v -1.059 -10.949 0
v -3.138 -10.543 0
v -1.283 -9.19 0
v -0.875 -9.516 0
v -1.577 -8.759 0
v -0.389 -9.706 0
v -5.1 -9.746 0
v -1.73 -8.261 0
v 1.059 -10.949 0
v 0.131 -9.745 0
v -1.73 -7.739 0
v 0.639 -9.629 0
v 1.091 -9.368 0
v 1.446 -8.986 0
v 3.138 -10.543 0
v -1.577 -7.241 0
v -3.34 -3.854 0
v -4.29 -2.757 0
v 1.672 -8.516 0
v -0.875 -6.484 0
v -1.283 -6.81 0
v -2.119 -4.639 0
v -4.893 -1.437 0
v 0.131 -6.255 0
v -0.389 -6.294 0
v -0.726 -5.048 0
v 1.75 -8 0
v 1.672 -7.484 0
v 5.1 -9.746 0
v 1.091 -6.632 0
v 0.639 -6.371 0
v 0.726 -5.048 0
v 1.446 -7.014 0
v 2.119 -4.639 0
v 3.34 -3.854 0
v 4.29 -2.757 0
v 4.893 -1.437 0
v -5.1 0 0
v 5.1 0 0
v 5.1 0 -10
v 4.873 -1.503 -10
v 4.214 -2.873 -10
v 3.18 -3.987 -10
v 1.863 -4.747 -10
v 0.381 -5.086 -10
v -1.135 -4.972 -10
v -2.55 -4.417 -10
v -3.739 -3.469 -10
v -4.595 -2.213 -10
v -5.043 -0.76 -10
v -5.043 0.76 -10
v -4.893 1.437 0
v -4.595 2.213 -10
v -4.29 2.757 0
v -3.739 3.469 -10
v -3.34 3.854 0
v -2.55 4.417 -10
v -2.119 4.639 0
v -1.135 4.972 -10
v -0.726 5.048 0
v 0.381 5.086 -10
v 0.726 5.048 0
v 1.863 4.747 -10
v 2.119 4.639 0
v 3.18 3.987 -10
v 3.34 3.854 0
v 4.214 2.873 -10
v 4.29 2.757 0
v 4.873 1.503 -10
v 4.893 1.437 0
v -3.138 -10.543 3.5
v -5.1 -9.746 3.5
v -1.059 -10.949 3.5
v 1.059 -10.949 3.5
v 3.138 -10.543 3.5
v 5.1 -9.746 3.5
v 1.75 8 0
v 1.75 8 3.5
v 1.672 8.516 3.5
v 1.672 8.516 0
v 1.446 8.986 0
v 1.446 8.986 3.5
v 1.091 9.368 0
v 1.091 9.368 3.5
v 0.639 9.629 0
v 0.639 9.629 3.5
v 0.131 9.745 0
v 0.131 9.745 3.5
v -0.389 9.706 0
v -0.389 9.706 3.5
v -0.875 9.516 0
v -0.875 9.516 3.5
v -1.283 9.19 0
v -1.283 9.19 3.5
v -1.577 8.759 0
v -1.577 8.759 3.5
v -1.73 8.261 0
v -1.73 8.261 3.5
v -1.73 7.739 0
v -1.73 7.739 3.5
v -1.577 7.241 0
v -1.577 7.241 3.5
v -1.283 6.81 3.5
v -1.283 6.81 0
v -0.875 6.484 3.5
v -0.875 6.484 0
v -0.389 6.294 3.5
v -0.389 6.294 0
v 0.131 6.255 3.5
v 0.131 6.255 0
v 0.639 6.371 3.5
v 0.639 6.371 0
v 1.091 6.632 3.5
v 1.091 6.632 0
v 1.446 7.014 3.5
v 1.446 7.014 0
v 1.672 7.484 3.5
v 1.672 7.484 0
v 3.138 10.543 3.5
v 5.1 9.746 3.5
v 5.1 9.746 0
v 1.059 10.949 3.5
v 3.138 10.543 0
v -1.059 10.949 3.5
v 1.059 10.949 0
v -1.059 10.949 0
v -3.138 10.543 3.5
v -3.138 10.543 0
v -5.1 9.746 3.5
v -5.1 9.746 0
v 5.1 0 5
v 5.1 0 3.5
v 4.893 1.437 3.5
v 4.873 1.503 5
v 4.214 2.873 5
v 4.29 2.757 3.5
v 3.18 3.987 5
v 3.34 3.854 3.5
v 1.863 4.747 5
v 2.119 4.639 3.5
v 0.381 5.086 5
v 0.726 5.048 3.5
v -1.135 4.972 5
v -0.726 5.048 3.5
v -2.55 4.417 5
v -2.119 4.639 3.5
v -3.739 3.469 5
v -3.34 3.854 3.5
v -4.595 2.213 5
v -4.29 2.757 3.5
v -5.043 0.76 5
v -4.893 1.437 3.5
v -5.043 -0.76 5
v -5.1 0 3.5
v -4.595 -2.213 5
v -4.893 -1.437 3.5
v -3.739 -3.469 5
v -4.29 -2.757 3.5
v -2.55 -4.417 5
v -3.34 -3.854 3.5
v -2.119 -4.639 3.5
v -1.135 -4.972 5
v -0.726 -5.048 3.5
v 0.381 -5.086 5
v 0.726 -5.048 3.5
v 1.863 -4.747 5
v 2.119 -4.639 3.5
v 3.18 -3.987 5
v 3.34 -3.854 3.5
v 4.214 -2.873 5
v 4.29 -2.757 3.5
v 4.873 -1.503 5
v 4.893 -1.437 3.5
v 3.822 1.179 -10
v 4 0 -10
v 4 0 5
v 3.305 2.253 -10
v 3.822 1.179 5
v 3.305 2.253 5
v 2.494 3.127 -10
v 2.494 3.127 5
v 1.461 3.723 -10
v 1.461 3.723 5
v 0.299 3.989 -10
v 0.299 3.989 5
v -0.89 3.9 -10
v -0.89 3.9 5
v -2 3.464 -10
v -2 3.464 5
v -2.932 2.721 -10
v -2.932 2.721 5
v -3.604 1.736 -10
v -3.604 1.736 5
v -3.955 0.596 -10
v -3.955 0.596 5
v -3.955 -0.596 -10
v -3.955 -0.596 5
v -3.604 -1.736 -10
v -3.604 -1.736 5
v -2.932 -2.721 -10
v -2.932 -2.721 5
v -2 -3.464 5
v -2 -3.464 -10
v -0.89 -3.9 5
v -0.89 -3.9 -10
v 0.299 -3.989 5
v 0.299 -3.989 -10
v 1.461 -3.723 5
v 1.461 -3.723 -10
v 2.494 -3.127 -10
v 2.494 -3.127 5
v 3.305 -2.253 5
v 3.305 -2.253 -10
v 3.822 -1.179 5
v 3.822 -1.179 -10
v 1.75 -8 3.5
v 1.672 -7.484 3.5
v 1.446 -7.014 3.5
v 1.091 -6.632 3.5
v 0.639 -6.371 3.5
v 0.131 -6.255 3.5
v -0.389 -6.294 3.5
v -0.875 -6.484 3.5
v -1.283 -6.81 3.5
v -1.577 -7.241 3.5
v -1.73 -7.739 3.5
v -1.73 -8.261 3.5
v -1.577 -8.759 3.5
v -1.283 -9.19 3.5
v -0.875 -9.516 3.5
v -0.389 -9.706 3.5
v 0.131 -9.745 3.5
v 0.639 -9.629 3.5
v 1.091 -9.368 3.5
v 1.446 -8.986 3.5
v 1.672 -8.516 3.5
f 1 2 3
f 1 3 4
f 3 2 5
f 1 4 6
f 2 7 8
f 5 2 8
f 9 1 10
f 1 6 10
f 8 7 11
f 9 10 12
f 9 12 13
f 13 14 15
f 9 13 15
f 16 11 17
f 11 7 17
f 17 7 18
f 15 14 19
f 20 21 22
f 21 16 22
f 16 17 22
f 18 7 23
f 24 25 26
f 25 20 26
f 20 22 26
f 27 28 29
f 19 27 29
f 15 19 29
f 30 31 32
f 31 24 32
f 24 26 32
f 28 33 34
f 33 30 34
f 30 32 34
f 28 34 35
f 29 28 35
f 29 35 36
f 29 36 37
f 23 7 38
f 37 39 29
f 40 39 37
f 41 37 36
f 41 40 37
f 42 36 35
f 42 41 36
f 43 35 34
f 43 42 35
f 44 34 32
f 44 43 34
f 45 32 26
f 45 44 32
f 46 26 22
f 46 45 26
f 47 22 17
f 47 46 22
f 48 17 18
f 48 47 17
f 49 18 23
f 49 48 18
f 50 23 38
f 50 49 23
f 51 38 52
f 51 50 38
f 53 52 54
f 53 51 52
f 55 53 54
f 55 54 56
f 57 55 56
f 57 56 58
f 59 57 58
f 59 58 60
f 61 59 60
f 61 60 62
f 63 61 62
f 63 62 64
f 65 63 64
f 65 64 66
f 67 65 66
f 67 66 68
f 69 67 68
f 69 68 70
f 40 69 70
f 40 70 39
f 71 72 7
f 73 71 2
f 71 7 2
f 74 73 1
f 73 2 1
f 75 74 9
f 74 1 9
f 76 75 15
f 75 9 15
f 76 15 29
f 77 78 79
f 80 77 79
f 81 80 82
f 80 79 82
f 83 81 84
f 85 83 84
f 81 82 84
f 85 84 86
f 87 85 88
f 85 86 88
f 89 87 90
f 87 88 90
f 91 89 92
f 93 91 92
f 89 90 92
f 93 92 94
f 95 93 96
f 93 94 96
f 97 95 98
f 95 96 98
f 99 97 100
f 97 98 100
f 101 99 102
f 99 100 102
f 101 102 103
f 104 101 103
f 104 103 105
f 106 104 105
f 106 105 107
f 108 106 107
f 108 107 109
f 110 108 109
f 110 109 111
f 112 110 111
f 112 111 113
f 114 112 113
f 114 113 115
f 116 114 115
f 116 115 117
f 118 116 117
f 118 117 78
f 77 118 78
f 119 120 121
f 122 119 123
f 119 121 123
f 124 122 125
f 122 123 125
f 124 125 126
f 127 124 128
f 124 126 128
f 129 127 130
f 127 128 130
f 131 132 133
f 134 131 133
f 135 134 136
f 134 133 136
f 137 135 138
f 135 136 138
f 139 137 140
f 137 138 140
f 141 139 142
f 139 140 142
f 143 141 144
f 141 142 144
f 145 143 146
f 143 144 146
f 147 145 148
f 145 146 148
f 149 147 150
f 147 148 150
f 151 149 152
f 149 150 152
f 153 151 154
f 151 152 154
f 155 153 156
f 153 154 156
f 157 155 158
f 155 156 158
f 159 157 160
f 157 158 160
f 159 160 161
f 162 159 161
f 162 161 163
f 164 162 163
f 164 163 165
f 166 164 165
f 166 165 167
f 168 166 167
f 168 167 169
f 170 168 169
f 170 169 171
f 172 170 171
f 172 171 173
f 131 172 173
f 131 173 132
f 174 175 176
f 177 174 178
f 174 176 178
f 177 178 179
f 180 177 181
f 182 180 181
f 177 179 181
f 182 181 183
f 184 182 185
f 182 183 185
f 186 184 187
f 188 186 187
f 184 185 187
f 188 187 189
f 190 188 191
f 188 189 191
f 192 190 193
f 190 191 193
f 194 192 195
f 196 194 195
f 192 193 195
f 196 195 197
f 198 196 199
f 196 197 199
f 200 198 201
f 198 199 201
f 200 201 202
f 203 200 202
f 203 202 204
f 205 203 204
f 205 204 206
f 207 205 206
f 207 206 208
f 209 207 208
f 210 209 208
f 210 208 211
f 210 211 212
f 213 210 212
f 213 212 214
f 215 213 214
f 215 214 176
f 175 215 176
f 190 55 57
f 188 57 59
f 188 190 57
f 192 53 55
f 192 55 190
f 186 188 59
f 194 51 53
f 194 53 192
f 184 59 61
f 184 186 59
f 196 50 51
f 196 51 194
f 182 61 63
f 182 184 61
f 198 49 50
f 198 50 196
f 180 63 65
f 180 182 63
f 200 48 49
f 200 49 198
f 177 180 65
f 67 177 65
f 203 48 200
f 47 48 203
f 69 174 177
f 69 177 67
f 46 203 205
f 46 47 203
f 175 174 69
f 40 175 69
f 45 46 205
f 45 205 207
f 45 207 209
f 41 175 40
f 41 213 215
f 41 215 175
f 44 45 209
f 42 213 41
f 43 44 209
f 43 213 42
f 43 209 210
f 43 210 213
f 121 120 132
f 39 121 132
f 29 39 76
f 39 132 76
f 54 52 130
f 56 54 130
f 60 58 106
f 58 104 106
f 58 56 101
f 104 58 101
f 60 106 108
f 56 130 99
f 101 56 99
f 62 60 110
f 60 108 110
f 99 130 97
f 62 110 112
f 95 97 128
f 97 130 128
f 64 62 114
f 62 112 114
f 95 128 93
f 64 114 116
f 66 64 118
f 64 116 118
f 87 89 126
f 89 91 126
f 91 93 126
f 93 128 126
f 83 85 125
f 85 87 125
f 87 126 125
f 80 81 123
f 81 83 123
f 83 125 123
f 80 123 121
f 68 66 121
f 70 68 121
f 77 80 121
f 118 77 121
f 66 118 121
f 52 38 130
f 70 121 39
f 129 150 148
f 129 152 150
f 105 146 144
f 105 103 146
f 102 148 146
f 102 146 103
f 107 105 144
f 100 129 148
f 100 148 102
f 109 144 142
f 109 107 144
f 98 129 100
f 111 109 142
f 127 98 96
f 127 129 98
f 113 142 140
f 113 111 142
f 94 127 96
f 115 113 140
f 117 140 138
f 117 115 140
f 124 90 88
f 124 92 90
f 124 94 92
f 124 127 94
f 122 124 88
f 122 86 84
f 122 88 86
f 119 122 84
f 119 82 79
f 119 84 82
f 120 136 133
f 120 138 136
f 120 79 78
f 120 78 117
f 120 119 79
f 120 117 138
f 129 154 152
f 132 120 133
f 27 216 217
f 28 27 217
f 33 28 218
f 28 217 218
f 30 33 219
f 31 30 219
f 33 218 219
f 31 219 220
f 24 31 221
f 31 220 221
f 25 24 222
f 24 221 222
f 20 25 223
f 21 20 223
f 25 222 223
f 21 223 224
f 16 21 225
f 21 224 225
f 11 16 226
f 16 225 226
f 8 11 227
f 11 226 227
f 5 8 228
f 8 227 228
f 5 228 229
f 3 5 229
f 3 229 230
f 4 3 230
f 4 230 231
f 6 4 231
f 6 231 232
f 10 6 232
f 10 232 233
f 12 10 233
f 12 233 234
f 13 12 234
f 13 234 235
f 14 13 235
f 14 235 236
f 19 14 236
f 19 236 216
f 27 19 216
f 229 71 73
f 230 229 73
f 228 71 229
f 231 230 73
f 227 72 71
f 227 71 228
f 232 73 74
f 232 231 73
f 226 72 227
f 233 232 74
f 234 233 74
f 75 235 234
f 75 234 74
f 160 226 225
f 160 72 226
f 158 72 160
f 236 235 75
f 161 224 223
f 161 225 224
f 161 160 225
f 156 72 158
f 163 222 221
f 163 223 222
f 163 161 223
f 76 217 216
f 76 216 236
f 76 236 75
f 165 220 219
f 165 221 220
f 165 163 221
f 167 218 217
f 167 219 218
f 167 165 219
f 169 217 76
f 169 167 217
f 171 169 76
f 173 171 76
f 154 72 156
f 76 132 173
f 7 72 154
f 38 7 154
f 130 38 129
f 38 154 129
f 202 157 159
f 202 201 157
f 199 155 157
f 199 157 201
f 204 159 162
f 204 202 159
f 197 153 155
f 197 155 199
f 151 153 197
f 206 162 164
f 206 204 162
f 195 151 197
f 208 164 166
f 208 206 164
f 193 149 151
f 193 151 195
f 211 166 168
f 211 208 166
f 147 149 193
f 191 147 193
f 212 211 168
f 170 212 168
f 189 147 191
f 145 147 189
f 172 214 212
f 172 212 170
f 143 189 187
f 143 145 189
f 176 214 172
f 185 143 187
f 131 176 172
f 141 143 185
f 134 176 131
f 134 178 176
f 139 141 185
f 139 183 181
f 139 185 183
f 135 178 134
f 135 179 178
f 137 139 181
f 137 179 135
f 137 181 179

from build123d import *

# Parameters (mm, degrees)
SKETCH_1_R          = 11
EXTRUDE_1_DEPTH     = 3.5
CUT_EXTRUDE_1_REACH = 17.945
SKETCH_3_R          = 5.1
EXTRUDE_2_DEPTH     = 1.5
EXTRUDE_START       = 10
SKETCH_4_R          = 5.1
EXTRUDE_3_DEPTH     = 10
CUT_EXTRUDE_2_REACH = 20.146
SKETCH_5_R          = 1.75
CUT_EXTRUDE_3_REACH = 21.288
SKETCH_6_R          = 4


with BuildPart() as part:
    # 草图1 → 凸台-拉伸1 (new body)
    with BuildSketch(Plane.XY):
        Circle(SKETCH_1_R)
    extrude(amount=EXTRUDE_1_DEPTH)

    # 草图2 → 切除-拉伸1 (cut, up to next)
    with BuildSketch(Plane.XY.offset(3.5), mode=Mode.PRIVATE) as cut_extrude_1_sk1:
        with BuildLine():
            ThreePointArc((-5.1, 9.746281342), (-11, 0), (-5.1, -9.746281342))
            Line((-5.1, -9.746281342), (-5.1, 9.746281342))
        make_face()
    cut_extrude_1_tool1 = extrude(cut_extrude_1_sk1.sketch, amount=-CUT_EXTRUDE_1_REACH, mode=Mode.PRIVATE) & part.part
    # 草图2 → 切除-拉伸1 (cut, up to next)
    with BuildSketch(Plane.XY.offset(3.5), mode=Mode.PRIVATE) as cut_extrude_1_sk2:
        with BuildLine():
            Line((5.1, 9.746281342), (5.1, -9.746281342))
            ThreePointArc((5.1, -9.746281342), (9.410100956, -5.696490147), (11, 0))
            ThreePointArc((11, 0), (9.410100956, 5.696490147), (5.1, 9.746281342))
        make_face()
    cut_extrude_1_tool2 = extrude(cut_extrude_1_sk2.sketch, amount=-CUT_EXTRUDE_1_REACH, mode=Mode.PRIVATE) & part.part
    add(cut_extrude_1_tool1.solids().sort_by_distance((-7.524361, 0, 3.5))[0], mode=Mode.SUBTRACT)
    add(cut_extrude_1_tool2.solids().sort_by_distance((7.524361, 0, 3.5))[0], mode=Mode.SUBTRACT)

    # 草图3 → 凸台-拉伸2 (add)
    with BuildSketch(Plane.XY.offset(3.5)):
        Circle(SKETCH_3_R)
    extrude(amount=EXTRUDE_2_DEPTH)

    # 草图4 → 凸台-拉伸3 (add)
    with BuildSketch(Plane(origin=(0, 0, 0), x_dir=(-1, 0, 0), z_dir=(0, 0, -1)).offset(EXTRUDE_START)):
        with Locations(Location((0, 0, 0), (0, 0, 180))):
            Circle(SKETCH_4_R)
    extrude(amount=-EXTRUDE_3_DEPTH)

    # 草图5 → 切除-拉伸2 (cut, up to next)
    with BuildSketch(Plane.XY.offset(3.5), mode=Mode.PRIVATE) as cut_extrude_2_sk1:
        with Locations((0, 8)):
            Circle(SKETCH_5_R)
    cut_extrude_2_tool1 = extrude(cut_extrude_2_sk1.sketch, amount=-CUT_EXTRUDE_2_REACH, mode=Mode.PRIVATE) & part.part
    # 草图5 → 切除-拉伸2 (cut, up to next)
    with BuildSketch(Plane.XY.offset(3.5), mode=Mode.PRIVATE) as cut_extrude_2_sk2:
        with Locations((0, -8)):
            Circle(SKETCH_5_R)
    cut_extrude_2_tool2 = extrude(cut_extrude_2_sk2.sketch, amount=-CUT_EXTRUDE_2_REACH, mode=Mode.PRIVATE) & part.part
    add(cut_extrude_2_tool1.solids().sort_by_distance((0, 8, 3.5))[0], mode=Mode.SUBTRACT)
    add(cut_extrude_2_tool2.solids().sort_by_distance((0, -8, 3.5))[0], mode=Mode.SUBTRACT)

    # 草图6 → 切除-拉伸3 (cut, up to next)
    with BuildSketch(Plane.XY.offset(5), mode=Mode.PRIVATE) as cut_extrude_3_sk1:
        Circle(SKETCH_6_R)
    cut_extrude_3_tool1 = extrude(cut_extrude_3_sk1.sketch, amount=-CUT_EXTRUDE_3_REACH, mode=Mode.PRIVATE) & part.part
    add(cut_extrude_3_tool1.solids().sort_by_distance((0, 0, 5))[0], mode=Mode.SUBTRACT)


solid = part.part
